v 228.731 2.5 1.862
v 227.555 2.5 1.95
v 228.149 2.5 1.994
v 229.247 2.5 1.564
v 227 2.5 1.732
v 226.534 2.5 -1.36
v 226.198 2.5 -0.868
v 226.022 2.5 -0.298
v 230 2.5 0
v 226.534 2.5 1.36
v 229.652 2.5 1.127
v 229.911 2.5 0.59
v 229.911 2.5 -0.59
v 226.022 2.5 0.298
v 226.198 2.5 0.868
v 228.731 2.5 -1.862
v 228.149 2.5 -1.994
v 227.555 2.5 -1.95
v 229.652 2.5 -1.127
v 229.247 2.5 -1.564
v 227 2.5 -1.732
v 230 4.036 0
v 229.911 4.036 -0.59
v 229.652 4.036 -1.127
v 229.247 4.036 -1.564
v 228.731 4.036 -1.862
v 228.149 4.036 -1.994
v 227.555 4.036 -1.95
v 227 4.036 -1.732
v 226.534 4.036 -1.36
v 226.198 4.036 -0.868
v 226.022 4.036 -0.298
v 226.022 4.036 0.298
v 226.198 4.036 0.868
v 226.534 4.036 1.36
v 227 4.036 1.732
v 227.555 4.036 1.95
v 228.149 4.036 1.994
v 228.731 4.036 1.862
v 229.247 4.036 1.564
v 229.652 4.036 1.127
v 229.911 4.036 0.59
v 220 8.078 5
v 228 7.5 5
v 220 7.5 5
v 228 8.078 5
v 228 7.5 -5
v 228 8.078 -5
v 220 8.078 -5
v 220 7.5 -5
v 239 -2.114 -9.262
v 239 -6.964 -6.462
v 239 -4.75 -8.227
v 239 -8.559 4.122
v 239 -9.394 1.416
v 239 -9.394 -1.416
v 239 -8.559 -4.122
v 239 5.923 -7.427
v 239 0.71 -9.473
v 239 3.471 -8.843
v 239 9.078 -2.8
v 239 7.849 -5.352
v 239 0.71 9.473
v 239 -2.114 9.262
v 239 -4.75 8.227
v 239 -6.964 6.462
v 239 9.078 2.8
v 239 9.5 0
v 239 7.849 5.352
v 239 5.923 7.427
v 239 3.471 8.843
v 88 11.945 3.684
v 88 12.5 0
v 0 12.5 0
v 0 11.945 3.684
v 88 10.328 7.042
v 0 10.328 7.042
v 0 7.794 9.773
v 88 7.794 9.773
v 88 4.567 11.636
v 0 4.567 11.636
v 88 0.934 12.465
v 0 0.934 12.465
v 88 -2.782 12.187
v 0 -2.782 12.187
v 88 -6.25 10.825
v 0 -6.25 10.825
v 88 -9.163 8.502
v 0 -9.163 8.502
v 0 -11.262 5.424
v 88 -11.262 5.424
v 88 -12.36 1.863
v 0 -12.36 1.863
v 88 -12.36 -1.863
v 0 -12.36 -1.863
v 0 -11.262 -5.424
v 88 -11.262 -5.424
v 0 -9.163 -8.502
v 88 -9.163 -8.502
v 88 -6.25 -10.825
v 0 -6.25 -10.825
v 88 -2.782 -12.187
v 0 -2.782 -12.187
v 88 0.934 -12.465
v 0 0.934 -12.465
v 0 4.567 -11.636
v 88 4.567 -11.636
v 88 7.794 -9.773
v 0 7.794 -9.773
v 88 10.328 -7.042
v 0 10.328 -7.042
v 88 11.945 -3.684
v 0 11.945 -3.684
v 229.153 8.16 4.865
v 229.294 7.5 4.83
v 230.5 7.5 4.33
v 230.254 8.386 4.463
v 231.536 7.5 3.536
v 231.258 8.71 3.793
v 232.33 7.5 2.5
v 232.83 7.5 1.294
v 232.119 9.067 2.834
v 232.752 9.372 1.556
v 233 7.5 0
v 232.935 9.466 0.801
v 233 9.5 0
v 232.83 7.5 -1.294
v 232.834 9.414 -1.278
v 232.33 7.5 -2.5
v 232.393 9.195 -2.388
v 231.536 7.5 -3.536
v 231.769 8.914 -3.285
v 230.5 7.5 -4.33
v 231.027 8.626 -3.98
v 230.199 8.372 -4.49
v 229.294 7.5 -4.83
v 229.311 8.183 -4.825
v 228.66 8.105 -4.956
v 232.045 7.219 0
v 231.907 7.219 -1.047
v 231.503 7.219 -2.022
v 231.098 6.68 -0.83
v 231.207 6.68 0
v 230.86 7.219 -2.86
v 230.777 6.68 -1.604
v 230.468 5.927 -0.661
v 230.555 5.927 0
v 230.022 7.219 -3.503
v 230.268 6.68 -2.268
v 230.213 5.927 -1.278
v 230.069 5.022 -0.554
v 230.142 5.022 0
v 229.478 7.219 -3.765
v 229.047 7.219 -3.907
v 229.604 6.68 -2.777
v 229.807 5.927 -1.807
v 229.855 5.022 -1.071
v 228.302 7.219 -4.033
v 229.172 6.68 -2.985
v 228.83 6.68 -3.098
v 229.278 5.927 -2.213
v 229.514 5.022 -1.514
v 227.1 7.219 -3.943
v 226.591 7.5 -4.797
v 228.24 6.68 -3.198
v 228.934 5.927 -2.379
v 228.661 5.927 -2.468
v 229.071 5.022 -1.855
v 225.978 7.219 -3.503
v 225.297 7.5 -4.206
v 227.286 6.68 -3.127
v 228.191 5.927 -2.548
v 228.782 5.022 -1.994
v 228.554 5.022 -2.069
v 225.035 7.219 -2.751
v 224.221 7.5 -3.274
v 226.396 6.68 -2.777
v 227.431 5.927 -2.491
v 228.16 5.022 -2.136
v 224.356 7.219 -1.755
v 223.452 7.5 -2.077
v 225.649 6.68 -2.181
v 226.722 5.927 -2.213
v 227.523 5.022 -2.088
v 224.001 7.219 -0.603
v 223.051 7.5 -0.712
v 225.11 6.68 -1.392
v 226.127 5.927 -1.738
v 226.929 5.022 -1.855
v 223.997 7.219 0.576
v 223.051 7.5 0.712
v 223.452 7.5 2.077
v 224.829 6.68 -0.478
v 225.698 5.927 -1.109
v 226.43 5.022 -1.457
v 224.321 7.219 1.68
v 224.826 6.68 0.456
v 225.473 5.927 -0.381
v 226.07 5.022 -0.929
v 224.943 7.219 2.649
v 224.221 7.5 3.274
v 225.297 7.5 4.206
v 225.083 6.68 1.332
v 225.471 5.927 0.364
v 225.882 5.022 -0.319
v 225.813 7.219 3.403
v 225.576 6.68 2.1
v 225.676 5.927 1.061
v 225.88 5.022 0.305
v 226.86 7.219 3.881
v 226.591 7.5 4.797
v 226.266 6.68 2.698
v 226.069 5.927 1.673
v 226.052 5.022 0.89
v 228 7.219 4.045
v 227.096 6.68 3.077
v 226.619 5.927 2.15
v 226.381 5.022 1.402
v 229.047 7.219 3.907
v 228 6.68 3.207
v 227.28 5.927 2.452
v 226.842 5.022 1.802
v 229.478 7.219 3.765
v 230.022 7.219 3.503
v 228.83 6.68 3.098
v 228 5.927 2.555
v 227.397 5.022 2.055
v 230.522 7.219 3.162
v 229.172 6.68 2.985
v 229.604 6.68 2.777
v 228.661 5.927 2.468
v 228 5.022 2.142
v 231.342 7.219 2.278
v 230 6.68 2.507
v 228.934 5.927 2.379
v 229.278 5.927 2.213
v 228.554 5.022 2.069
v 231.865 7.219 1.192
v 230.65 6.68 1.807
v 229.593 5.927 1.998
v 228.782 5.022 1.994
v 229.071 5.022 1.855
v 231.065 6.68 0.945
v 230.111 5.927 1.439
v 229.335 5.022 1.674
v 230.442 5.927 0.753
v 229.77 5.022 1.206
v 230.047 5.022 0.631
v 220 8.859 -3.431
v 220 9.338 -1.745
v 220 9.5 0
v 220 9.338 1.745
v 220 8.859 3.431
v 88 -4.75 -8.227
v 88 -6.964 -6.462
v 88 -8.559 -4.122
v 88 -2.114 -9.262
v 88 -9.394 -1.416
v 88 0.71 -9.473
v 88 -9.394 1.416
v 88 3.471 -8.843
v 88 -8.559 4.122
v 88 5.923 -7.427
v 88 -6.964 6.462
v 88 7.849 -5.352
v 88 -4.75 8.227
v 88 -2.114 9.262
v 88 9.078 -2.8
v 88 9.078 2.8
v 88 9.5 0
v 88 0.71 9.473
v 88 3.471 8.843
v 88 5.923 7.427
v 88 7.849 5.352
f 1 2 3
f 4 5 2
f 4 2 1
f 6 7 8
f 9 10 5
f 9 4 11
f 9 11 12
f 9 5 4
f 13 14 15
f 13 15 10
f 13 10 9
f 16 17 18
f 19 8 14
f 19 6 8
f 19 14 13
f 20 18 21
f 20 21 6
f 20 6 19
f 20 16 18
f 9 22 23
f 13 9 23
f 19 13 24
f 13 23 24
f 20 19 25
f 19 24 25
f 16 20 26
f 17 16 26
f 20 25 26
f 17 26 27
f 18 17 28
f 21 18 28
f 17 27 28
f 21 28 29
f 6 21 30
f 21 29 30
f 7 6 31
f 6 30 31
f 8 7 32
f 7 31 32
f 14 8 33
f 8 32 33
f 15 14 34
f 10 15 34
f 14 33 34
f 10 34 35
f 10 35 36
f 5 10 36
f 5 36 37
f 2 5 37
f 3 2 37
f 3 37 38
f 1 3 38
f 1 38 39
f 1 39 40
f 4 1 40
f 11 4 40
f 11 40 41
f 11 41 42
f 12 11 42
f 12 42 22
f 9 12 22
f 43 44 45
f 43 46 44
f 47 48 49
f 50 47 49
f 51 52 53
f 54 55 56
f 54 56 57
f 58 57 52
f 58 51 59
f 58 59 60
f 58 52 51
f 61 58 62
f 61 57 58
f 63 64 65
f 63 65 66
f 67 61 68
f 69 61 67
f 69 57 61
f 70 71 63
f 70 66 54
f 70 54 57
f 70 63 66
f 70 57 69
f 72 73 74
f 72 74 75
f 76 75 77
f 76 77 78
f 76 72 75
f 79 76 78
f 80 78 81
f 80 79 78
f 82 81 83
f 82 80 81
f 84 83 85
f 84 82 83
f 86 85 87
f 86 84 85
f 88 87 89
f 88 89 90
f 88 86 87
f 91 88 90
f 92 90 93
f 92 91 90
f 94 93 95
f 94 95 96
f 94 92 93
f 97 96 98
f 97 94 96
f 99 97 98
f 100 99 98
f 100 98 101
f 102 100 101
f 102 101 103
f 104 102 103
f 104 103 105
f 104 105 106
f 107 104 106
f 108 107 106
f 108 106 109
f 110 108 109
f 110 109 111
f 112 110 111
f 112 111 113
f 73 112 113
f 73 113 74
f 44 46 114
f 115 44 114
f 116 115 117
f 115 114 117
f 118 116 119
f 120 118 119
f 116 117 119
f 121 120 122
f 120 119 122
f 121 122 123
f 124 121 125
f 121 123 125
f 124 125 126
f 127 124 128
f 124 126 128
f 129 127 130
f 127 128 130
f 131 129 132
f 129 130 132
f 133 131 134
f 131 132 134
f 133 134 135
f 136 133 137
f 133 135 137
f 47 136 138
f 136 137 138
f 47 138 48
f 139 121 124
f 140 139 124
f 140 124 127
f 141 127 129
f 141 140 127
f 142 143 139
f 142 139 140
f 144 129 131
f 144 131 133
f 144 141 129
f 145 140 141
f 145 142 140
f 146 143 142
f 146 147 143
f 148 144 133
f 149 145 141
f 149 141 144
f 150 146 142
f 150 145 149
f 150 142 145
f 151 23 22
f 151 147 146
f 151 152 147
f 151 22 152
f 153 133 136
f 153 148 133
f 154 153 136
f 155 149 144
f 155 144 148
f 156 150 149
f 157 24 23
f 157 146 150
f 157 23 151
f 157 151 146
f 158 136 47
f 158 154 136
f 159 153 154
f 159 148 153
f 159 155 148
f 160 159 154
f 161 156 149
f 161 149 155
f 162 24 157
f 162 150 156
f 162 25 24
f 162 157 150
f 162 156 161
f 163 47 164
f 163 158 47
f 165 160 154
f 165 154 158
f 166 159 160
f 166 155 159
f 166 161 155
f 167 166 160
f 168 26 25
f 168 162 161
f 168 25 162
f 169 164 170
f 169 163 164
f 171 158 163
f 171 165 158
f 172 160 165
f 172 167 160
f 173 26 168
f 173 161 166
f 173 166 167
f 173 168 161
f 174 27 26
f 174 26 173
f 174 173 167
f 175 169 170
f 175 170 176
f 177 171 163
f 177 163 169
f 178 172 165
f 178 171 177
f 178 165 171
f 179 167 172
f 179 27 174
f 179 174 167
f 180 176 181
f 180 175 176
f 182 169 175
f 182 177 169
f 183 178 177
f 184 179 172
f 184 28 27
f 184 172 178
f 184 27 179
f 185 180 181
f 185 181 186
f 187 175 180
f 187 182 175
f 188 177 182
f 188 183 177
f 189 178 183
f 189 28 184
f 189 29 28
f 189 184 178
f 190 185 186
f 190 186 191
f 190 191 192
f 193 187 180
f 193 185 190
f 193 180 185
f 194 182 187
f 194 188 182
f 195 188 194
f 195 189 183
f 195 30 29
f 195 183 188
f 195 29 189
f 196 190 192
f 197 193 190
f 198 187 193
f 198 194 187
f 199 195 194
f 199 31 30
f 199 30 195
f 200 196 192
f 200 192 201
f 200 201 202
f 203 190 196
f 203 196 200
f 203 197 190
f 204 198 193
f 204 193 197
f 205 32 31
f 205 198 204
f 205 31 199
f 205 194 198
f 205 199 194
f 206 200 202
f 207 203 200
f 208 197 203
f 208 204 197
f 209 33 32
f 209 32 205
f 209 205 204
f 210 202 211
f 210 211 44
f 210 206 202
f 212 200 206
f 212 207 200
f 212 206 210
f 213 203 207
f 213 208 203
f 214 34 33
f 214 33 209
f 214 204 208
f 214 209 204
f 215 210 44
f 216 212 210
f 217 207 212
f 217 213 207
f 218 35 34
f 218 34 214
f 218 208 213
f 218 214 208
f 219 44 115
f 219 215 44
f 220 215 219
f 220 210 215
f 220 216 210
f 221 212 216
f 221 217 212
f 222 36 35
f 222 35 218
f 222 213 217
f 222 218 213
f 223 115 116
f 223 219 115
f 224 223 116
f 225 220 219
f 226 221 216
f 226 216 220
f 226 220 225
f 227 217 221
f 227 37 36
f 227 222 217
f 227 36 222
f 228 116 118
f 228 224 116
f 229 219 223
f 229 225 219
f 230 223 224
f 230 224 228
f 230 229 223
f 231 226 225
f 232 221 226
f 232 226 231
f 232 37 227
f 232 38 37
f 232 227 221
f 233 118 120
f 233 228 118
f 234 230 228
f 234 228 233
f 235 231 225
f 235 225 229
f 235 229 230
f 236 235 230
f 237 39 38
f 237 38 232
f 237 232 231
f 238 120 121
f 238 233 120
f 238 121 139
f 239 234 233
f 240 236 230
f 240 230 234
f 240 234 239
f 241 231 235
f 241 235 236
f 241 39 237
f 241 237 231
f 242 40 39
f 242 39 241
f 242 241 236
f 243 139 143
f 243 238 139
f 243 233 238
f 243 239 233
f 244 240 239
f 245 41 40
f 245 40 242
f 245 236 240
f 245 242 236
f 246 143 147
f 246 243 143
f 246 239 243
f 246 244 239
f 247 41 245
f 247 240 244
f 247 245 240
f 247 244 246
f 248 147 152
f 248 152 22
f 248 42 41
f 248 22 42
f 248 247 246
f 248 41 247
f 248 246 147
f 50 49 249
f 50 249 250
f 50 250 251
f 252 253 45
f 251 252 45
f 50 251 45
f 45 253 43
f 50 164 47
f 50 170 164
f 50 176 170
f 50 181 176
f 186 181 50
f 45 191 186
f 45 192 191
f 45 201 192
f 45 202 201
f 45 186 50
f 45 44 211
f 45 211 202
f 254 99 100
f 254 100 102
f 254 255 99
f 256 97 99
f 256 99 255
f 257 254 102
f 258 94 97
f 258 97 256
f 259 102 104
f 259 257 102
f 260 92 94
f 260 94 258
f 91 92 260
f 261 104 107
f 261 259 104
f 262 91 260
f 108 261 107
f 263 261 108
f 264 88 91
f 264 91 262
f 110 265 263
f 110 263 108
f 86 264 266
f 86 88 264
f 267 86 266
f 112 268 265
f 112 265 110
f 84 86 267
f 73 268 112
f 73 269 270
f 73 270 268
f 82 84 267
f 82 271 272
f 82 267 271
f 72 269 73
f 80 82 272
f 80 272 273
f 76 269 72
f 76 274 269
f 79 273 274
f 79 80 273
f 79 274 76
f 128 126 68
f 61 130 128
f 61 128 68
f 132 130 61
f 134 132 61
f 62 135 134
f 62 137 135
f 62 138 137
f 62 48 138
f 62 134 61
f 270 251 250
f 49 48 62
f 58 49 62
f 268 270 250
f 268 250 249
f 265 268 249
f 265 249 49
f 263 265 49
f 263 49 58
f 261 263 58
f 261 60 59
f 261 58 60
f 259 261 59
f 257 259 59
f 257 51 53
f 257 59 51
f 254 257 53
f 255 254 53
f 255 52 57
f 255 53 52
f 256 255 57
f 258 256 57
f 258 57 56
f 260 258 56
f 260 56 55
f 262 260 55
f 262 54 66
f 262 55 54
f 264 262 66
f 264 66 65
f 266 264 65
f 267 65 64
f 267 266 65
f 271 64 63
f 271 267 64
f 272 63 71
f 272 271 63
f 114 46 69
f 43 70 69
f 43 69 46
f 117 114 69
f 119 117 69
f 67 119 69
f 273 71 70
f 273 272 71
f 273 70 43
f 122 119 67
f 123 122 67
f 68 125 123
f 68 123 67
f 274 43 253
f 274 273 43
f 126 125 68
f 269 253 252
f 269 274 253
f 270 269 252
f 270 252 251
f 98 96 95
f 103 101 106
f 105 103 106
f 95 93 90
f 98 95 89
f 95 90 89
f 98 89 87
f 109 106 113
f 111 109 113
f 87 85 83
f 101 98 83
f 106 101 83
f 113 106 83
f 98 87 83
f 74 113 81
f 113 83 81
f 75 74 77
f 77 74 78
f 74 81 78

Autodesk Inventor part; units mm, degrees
ref_plane "YZ Plane" through (0, 0, 0) normal (1, 0, 0) x (0, 1, 0)
sketch "Sketch1" plane through (0, 0, 0) normal (0, 0, 1) x (1, 0, 0)
  line L0 (0, 0) -> (239, 0)
  line L1 (239, 0) -> (239, 9.5)
  line L2 (0, 0) -> (0, 12.5)
  line L3 (0, 12.5) -> (88, 12.5)
  line L4 (239, 9.5) -> (88, 9.5)
  line L5 (88, 9.5) -> (88, 12.5)
  dimension "d1" = 9.5
  dimension "d3" = 12.5
  dimension "d19" = 88
  dimension "d21" = 151
revolve "Revolution1" add sketch "Sketch1" angle 360 about axis through (0, 0, 0) along (1, 0, 0)
ref_plane "Work Plane3" through (44, 12.5, 0) normal (0, 1, 0) x (-1, 0, 0)
ref_plane "Work Plane4" through (44, 12.5, 0) normal (0, 1, 0) x (-1, 0, 0)
ref_plane "Work Plane5" through (163.5, 9.5, 0) normal (0, 1, 0) x (-1, 0, 0)
sketch "Sketch6" plane through (163.5, 9.5, 0) normal (0, 1, 0) x (-1, 0, 0)
  line L0 (-75.5, 9.5) -> (-75.5, -9.5) projected
  circle A0 centre (-64.5, 0) radius 5
  point P0 (163.5, 0)
  point P1 (-75.5, 0)
  dimension "d27" = 10
  dimension "d28" = 11
extrude "Extrusion5" cut sketch "Sketch6" against normal blind 2
sketch "Sketch7" plane through (228, 7.5, 0) normal (0, 1, 0) x (1, 0, 0)
  circle A0 centre (0, 0) radius 2
  point P0 (-228, 0)
  dimension "d32" = 4
extrude "Extrusion6" cut sketch "Sketch7" against normal blind 5
fillet "Fillet2" radius 3.5 1 edges at (226, 7.5, 0)
sketch "Sketch8" plane through (44, 12.5, 0) normal (0, 1, 0) x (-1, 0, 0)
  point P0 (44, 0)
sketch "Sketch9" plane through (163.5, 9.5, 0) normal (0, 1, 0) x (-1, 0, 0)
  circle A0 centre (-64.5, 0) radius 5 projected
  line L0 (-64.5, 5) -> (-56.5, 5)
  line L1 (-64.5, -5) -> (-56.5, -5)
  line L2 (-56.5, -5) -> (-56.5, 5)
  point P0 (163.5, 0)
  dimension "d36" = 8
  dimension "d37" = 8
extrude "Extrusion7" cut sketch "Sketch9" against normal blind 2 contours A0 L0 L2 L1
ref_plane "Work Plane6" through (0, 4.75, 0) normal (0, 1, 0) x (-1, 0, 0)
properties part number "eixo final"
